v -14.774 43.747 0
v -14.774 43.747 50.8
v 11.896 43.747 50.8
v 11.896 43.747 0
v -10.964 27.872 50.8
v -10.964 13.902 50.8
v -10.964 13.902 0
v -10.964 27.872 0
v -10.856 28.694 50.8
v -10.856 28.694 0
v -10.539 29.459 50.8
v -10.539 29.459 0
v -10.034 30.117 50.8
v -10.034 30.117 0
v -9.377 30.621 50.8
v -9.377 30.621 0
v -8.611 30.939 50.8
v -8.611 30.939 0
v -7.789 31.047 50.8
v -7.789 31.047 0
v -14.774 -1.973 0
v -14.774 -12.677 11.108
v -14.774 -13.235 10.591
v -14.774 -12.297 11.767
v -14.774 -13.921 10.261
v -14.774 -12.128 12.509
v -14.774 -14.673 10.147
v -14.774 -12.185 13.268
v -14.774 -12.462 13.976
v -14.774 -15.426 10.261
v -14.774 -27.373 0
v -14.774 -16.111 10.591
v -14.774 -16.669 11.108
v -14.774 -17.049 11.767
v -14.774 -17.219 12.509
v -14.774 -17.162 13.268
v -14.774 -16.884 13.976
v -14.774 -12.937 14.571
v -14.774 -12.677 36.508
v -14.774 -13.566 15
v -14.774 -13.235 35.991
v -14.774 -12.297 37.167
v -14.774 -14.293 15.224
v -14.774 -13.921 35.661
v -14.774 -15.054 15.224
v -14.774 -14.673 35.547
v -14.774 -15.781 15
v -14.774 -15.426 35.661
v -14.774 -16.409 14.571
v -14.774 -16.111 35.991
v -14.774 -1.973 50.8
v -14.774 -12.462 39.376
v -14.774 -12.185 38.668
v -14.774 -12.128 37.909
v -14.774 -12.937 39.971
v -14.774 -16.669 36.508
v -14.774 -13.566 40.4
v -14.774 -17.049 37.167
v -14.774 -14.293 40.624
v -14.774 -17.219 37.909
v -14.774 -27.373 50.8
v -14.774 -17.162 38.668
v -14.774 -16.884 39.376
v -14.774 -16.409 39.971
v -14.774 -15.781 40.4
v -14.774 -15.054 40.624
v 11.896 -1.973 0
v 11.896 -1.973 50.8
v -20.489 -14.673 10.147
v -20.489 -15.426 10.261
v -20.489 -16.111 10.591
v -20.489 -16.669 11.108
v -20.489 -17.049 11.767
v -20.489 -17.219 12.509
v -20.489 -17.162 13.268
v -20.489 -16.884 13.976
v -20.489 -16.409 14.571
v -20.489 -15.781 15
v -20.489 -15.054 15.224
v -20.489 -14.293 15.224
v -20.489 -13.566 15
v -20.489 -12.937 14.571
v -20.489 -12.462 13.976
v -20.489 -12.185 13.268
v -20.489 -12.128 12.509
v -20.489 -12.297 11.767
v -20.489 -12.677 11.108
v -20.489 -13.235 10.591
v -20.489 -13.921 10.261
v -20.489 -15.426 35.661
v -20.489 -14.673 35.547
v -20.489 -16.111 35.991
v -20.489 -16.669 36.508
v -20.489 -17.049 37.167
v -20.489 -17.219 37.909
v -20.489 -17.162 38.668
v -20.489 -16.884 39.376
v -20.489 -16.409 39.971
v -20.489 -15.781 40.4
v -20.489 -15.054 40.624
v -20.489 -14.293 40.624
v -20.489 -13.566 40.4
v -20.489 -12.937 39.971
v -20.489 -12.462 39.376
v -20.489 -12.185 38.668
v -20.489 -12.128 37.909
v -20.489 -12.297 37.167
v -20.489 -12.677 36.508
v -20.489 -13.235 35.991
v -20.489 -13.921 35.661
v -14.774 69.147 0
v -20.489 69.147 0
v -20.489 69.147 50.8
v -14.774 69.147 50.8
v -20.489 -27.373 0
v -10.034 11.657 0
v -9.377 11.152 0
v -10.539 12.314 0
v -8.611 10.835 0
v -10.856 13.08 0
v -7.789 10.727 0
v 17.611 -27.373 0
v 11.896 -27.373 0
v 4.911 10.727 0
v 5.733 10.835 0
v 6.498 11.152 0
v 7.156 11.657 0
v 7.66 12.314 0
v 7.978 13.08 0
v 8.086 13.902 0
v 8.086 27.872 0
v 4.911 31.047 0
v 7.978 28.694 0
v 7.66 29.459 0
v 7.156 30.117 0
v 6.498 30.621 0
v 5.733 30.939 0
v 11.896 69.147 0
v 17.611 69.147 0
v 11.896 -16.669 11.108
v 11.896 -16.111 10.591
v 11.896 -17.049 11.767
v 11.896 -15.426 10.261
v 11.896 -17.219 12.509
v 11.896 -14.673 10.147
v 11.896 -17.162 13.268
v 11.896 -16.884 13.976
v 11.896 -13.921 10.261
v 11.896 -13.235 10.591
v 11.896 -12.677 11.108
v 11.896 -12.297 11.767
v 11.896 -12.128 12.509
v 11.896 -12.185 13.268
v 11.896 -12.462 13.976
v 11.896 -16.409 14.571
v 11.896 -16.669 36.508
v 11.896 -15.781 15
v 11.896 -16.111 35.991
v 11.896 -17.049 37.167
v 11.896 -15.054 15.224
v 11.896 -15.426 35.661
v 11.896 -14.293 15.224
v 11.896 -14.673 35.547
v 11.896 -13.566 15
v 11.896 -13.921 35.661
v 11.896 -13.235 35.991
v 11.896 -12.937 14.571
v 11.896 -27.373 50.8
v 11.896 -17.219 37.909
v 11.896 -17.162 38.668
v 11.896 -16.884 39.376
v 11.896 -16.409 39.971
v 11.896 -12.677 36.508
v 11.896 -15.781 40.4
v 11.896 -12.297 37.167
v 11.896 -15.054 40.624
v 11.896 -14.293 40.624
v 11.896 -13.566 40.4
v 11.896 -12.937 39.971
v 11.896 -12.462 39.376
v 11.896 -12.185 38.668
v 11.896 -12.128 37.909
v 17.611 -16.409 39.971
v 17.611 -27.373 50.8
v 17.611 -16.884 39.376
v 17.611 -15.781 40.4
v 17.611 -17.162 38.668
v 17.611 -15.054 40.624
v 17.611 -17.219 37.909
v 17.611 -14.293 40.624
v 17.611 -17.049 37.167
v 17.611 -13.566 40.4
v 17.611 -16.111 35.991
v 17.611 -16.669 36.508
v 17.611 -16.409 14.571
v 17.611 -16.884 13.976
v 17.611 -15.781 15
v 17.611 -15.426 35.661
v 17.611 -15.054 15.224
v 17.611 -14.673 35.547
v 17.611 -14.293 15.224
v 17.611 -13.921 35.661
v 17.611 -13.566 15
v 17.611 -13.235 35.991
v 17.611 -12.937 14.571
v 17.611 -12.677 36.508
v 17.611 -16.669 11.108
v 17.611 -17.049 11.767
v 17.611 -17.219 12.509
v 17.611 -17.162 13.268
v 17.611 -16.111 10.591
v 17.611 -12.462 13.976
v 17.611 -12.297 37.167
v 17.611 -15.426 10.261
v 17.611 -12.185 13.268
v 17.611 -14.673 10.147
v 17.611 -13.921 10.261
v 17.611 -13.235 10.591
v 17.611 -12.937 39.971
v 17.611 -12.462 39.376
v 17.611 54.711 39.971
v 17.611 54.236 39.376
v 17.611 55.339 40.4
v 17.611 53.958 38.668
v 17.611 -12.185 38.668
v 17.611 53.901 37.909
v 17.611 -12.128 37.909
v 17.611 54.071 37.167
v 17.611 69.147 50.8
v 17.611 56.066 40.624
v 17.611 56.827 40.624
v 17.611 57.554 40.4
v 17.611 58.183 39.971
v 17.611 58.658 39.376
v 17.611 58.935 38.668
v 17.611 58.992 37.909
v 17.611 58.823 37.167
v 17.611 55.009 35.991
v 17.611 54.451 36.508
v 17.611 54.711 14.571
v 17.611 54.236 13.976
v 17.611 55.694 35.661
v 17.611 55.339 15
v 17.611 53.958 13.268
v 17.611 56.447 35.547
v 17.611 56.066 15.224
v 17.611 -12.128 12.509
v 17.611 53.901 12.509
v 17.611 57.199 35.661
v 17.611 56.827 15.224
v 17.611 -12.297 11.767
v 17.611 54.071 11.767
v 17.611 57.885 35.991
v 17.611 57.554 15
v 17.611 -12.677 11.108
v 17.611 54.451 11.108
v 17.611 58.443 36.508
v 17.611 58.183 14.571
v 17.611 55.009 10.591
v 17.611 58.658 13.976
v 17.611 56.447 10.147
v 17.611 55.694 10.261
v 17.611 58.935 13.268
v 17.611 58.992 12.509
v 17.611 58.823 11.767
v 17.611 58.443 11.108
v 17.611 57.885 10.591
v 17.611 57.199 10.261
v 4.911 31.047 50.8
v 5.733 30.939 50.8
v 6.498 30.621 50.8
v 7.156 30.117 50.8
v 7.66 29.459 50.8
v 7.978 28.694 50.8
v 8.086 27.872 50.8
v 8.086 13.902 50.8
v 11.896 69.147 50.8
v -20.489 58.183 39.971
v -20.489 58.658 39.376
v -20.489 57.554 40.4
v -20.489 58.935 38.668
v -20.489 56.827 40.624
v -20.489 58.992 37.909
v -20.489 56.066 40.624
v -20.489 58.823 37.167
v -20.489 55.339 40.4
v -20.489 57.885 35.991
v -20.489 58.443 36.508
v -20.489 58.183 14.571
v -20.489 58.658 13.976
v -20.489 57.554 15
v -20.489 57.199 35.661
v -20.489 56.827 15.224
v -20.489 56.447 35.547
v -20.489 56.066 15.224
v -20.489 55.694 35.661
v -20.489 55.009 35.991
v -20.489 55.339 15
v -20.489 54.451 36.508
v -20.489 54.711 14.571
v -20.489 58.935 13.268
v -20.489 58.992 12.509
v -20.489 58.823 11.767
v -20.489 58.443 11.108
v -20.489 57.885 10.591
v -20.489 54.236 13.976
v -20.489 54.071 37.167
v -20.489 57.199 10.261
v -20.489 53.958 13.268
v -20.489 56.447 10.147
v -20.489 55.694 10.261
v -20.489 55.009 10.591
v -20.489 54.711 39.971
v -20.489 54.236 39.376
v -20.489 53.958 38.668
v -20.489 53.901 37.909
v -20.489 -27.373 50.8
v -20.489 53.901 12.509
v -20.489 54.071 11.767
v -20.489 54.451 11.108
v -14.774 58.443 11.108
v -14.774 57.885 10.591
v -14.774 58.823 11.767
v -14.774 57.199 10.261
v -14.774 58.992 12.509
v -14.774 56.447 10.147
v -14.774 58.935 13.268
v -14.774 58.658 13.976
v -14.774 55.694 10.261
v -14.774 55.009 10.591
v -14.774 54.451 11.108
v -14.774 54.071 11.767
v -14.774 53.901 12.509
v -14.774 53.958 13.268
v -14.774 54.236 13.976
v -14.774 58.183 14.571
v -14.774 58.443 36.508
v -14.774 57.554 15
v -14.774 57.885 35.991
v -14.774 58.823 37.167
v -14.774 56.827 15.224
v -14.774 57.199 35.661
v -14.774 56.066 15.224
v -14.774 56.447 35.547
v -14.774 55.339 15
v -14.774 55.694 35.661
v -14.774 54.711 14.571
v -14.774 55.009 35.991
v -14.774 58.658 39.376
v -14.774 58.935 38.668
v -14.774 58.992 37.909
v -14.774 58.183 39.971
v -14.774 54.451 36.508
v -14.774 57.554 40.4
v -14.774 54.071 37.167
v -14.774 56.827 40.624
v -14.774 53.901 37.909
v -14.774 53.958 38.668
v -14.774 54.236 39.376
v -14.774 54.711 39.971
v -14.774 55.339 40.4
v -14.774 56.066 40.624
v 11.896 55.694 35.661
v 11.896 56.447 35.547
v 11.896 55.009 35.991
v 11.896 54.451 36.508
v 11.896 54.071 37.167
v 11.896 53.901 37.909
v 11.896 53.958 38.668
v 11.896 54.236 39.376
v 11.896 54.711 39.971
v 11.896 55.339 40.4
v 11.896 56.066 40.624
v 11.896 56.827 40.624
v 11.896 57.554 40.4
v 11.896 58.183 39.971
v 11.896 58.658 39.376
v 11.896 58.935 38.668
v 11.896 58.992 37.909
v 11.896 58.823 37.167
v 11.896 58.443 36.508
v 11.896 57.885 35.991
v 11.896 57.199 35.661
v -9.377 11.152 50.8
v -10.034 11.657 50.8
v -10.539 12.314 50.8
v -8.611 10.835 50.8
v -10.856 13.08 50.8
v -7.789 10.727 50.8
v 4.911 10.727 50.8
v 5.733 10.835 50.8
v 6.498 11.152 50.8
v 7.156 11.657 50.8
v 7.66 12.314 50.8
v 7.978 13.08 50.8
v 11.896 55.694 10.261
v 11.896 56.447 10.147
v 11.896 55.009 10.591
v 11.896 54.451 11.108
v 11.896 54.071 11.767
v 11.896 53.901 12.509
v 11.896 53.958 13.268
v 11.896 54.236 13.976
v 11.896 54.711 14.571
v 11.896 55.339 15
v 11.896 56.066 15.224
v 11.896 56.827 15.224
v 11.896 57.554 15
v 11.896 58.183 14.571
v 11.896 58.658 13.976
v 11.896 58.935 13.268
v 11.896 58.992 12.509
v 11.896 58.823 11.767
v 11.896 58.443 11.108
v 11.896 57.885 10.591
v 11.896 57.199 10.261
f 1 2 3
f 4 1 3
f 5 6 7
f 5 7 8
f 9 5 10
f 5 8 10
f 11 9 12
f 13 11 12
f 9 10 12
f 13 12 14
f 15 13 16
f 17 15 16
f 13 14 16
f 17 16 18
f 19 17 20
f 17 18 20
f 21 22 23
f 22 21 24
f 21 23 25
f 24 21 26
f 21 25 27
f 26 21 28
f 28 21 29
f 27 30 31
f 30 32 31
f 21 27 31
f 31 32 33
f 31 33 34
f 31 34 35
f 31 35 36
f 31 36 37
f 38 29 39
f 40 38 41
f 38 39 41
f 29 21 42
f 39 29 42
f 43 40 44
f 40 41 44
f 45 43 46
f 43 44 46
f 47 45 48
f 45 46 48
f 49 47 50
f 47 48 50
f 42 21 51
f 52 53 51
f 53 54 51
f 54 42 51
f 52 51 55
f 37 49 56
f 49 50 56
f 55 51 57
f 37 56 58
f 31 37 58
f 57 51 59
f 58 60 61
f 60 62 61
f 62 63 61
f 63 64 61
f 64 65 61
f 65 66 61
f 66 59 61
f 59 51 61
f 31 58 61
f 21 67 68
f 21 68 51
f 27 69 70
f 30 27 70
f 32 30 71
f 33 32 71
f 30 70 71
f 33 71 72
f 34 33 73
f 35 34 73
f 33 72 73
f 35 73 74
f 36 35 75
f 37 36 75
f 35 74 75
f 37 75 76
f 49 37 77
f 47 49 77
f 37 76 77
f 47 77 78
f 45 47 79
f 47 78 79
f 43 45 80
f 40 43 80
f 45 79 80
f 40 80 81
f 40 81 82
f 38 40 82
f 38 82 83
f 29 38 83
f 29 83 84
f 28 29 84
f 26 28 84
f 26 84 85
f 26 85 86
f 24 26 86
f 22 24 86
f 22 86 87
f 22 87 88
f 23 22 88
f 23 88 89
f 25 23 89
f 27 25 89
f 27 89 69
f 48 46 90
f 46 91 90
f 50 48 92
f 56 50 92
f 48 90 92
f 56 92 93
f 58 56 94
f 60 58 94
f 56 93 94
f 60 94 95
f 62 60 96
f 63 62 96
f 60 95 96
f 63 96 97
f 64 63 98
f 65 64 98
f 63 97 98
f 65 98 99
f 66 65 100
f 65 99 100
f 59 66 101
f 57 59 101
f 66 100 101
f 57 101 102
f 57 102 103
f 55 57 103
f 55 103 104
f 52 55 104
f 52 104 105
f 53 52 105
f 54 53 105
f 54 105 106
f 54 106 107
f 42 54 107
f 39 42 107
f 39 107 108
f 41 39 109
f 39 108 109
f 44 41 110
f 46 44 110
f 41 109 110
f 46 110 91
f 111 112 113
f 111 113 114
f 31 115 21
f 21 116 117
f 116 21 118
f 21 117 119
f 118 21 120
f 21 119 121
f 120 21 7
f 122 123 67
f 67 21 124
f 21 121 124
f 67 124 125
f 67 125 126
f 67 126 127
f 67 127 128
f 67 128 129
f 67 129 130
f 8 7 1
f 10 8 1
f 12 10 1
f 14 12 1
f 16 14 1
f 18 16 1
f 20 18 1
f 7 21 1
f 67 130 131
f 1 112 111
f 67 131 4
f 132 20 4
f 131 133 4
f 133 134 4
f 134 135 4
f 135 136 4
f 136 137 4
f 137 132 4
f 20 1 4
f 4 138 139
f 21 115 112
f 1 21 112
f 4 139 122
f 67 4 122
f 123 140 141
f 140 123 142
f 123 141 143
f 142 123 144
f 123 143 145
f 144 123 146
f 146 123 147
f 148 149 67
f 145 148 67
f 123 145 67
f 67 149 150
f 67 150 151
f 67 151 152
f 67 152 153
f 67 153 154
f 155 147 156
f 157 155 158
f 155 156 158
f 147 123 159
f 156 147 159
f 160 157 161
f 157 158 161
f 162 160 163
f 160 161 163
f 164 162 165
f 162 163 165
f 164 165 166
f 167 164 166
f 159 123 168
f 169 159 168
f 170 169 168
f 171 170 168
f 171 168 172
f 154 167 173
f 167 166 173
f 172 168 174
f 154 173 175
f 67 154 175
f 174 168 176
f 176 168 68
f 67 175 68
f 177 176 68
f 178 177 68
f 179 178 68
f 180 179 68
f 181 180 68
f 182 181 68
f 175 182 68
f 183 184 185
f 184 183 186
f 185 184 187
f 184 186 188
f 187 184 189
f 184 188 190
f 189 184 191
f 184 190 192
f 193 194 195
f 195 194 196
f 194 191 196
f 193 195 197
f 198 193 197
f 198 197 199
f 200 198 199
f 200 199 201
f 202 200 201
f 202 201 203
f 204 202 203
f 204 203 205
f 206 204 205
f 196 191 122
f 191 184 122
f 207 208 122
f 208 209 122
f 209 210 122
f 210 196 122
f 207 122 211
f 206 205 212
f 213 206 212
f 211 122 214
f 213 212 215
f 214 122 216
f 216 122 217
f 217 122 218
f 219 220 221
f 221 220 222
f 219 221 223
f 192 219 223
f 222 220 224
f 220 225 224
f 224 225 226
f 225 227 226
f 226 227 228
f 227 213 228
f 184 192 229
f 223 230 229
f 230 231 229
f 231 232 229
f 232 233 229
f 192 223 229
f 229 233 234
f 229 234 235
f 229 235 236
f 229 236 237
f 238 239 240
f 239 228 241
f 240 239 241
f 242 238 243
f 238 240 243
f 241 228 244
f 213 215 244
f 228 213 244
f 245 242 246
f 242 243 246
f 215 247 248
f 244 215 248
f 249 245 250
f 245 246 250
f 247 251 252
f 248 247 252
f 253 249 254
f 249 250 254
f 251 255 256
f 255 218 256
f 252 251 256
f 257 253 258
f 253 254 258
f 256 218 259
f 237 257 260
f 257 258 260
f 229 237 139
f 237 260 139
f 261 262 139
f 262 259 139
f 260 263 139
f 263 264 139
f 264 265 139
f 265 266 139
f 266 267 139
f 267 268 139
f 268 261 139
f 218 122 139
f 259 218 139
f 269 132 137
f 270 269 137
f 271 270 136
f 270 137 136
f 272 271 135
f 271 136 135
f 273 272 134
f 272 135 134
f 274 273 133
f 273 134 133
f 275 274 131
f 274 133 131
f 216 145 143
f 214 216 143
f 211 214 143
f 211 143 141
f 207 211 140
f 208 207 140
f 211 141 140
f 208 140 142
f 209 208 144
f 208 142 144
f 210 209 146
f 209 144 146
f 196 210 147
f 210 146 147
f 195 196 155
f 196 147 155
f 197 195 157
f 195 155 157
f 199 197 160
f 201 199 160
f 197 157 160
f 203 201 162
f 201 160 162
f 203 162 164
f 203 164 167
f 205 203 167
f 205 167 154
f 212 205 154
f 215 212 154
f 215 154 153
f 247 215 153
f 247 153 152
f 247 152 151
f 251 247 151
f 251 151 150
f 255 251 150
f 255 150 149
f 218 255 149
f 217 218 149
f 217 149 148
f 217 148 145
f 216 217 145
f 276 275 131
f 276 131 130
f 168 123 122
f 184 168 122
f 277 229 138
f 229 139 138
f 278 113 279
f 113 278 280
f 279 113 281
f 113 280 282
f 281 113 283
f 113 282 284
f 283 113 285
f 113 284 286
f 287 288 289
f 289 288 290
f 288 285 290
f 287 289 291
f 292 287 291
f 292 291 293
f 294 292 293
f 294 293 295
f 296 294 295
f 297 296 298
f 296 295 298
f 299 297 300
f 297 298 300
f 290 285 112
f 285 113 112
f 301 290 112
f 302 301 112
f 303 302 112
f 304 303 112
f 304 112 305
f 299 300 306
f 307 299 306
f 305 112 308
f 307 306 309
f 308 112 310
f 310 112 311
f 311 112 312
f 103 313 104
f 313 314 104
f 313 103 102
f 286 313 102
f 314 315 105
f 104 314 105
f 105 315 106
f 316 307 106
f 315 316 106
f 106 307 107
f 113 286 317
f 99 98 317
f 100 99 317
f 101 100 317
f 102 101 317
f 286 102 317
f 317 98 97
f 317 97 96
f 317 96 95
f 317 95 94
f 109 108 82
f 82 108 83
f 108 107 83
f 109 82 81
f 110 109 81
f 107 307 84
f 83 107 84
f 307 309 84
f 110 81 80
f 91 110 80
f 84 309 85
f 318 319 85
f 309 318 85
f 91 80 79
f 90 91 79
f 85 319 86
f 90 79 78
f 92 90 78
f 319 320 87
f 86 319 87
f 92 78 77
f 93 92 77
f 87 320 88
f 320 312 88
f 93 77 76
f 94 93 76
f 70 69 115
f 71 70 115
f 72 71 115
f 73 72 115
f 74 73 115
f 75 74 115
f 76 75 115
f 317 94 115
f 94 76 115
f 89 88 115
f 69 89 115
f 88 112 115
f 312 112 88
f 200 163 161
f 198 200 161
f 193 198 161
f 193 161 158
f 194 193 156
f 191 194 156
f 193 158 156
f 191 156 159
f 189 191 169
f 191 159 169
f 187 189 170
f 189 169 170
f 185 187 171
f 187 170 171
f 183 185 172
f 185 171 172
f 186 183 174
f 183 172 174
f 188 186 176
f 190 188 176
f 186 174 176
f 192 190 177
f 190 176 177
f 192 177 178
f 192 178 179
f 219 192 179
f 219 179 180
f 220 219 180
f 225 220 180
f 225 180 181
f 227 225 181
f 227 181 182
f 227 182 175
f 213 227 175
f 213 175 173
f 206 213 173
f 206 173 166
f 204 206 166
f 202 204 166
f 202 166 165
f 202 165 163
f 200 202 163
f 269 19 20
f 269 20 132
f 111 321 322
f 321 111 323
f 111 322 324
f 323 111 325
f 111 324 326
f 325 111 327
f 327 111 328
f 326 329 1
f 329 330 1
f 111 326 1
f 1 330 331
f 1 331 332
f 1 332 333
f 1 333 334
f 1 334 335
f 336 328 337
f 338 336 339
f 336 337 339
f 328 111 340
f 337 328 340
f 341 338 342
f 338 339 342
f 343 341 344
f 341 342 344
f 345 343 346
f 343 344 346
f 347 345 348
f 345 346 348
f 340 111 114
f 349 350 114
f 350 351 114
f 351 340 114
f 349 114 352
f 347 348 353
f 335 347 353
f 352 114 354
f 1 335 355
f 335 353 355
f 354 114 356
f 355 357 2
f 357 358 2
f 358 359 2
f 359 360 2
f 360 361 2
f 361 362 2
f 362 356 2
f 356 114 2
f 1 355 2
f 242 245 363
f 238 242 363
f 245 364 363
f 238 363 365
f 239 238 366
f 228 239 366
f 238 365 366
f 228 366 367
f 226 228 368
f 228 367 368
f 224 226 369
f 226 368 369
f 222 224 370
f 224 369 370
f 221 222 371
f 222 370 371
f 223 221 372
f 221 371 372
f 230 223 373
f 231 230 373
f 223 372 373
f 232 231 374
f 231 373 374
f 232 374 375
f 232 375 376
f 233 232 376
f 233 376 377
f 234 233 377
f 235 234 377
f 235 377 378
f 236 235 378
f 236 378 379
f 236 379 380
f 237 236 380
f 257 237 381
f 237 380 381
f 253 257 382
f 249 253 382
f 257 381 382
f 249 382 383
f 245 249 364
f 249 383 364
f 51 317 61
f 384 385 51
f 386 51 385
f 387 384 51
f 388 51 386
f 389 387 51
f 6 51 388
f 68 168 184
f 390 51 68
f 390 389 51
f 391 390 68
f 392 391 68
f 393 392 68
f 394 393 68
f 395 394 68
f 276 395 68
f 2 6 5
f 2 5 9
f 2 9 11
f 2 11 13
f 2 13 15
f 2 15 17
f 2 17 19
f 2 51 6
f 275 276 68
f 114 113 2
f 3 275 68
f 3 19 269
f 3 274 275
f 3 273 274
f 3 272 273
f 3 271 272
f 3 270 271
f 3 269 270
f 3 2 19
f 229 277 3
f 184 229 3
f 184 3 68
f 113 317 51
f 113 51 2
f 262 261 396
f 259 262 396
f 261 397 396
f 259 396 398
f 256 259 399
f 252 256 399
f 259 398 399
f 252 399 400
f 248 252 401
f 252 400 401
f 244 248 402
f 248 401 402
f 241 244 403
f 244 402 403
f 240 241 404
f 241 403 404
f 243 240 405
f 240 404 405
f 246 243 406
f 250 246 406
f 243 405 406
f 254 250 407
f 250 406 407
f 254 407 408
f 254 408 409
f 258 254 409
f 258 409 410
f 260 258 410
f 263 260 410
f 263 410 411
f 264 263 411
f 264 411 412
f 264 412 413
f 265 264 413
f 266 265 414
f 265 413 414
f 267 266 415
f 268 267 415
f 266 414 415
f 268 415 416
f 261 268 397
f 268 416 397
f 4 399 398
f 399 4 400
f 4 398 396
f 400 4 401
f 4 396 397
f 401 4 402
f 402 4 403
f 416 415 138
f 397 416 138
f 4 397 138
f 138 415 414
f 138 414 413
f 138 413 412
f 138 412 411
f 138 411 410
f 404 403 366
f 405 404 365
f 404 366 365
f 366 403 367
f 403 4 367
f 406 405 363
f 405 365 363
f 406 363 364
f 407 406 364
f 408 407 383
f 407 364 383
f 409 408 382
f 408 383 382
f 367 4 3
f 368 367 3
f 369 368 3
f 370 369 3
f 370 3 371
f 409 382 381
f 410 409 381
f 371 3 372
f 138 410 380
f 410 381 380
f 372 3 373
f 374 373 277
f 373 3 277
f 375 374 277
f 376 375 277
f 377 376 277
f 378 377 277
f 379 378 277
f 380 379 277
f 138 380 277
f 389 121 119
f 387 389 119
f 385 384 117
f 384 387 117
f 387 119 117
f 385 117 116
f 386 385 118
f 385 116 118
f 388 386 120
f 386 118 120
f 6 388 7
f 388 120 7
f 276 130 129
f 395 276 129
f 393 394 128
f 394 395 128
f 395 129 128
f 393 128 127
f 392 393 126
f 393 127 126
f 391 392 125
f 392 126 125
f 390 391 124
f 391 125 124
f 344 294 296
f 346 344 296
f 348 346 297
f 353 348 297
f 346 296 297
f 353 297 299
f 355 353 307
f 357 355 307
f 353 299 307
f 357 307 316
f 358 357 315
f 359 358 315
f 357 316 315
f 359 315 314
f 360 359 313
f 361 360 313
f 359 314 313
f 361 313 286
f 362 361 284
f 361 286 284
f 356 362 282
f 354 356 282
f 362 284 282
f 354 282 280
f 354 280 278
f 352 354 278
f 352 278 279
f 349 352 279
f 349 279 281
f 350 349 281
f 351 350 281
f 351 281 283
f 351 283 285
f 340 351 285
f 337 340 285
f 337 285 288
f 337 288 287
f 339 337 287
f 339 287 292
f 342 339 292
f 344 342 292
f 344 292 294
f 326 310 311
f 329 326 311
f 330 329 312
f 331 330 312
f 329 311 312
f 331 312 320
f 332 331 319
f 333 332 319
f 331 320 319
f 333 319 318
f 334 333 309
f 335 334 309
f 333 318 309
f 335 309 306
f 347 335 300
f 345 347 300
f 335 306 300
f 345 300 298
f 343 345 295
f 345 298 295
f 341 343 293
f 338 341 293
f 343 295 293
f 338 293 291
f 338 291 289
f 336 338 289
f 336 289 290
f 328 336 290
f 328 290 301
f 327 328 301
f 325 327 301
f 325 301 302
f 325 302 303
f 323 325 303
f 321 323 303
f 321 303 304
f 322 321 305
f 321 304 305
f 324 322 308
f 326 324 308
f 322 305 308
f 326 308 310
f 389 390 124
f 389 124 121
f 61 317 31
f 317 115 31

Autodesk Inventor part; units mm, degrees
ref_plane "YZ Plane" through (0, 0, 0) normal (1, 0, 0) x (0, 1, 0)
ref_plane "XZ Plane" through (0, 0, 0) normal (0, 1, 0) x (-1, 0, 0)
ref_plane "XY Plane" through (0, 0, 0) normal (0, 0, 1) x (1, 0, 0)
sketch "Bracket-CrossArea" plane through (0, 0, 0) normal (0, 0, 1) x (1, 0, 0)
  line L0 (-20.4892, 69.1468) -> (-20.4892, -27.3732)
  line L1 (-20.4892, -27.3732) -> (-14.1392, -27.3732)
  line L2 (-14.1392, -27.3732) -> (-14.1392, -1.9732)
  line L3 (-14.1392, -1.9732) -> (11.2608, -1.9732)
  line L4 (11.2608, -1.9732) -> (11.2608, -27.3732)
  line L5 (11.2608, -27.3732) -> (17.6108, -27.3732)
  line L6 (17.6108, -27.3732) -> (17.6108, 69.1468)
  line L7 (17.6108, 69.1468) -> (11.2608, 69.1468)
  line L8 (11.2608, 69.1468) -> (11.2608, 43.7468)
  line L9 (11.2608, 43.7468) -> (-14.1392, 43.7468)
  line L10 (-14.1392, 43.7468) -> (-14.1392, 69.1468)
  line L11 (-20.4892, 69.1468) -> (-14.1392, 69.1468)
  point P0 (0, 0)
  dimension "d3" = 6.35
  dimension "d4" = 96.52
  dimension "d5" = 25.4
  dimension "d6" = 25.4
  dimension "d7" = 6.35
  dimension "d10" = 25.4
extrude "HBracket_3DShape" add sketch "Bracket-CrossArea" along normal blind 50.8
sketch "Sketch2" plane through (0, 0, 50.8) normal (0, 0, 1) x (1, 0, 0)
  line L0 (-10.9642, 31.0468) -> (8.0858, 31.0468)
  line L1 (8.0858, 31.0468) -> (8.0858, 10.7268)
  line L2 (8.0858, 10.7268) -> (-10.9642, 10.7268)
  line L3 (-10.9642, 10.7268) -> (-10.9642, 31.0468)
  line L4 (11.2608, 43.7468) -> (-14.1392, 43.7468) projected
  line L5 (-14.1392, -1.9732) -> (11.2608, -1.9732) projected
  line L6 (-14.1392, 43.7468) -> (-14.1392, 69.1468) projected
  line L7 (11.2608, 69.1468) -> (11.2608, 43.7468) projected
  line L8 (17.6108, -27.3732) -> (17.6108, 69.1468) projected
  line L9 (-20.4892, 69.1468) -> (-20.4892, -27.3732) projected
  point P0 (0, 0)
  dimension "d11" = 12.7
  dimension "d12" = 12.7
  dimension "d29" = 9.525
  dimension "d30" = 9.525
extrude "MiddleHole" cut sketch "Sketch2" against normal through all
fillet "RoundedInside" radius 3.175 4 edges at (-10.9642, 10.7268, 25.4) (-10.9642, 31.0468, 25.4) (8.0858, 31.0468, 25.4) (8.0858, 10.7268, 25.4)
sketch "Sketch4" plane through (17.6108, -27.3732, 0) normal (1, 0, 0) x (0, 0, -1)
  line L0 (0, 71.12) -> (-50.8, 71.12) projected
  line L1 (0, 71.12) -> (-50.8, 71.12) projected
  line L2 (0, 0) -> (-50.8, 0) projected
  line L3 (0, 25.4) -> (-50.8, 25.4) projected
  line L4 (0, 0) -> (0, 96.52) projected
  line L5 (0, 96.52) -> (-50.8, 96.52) projected
  line L6 (-50.8, 0) -> (-50.8, 96.52) projected
  line L7 (0, 0) -> (-50.8, 0) projected
  point P0 (0, 27.3732)
  point P1 (-38.1, 83.82)
  point P2 (-12.7, 83.82)
  point P3 (-38.1, 12.7)
  point P4 (-12.7, 12.7)
  dimension "d48" = 12.7
  dimension "d49" = 12.7
  dimension "d52" = 25.4
  dimension "d55" = 71.12
hole "Screw Holes" at (17.6108, 56.4468, 38.1) at (17.6108, 56.4468, 12.7) at (17.6108, -14.6732, 38.1) at (17.6108, -14.6732, 12.7) direction (-1, 0, 0) diameter 5.1054 end through all clearance for "Hex Machine Screw" size "#10" standard "Ansi Unified Screw Threads"
sketch "GapSpacing" plane through (0, 0, 50.8) normal (0, 0, 1) x (1, 0, 0)
  line L0 (-20.4892, -27.3732) -> (-14.1392, -27.3732) projected
  line L1 (-14.1392, -27.3732) -> (-14.1392, -1.9732) projected
  line L2 (-14.1392, -1.9732) -> (11.2608, -1.9732) projected
  line L3 (11.2608, -1.9732) -> (11.2608, -27.3732) projected
  line L4 (11.2608, -27.3732) -> (17.6108, -27.3732) projected
  line L5 (17.6108, -27.3732) -> (17.6108, 69.1468) projected
  line L6 (17.6108, 69.1468) -> (11.2608, 69.1468) projected
  line L7 (11.2608, 69.1468) -> (11.2608, 43.7468) projected
  line L8 (11.2608, 43.7468) -> (-14.1392, 43.7468) projected
  line L9 (-14.1392, 43.7468) -> (-14.1392, 69.1468) projected
  line L10 (-14.1392, 69.1468) -> (-20.4892, 69.1468) projected
  line L11 (-20.4892, 69.1468) -> (-20.4892, -27.3732) projected
  line L12 (-14.7742, 43.7468) -> (11.8958, 43.7468)
  line L13 (11.8958, 43.7468) -> (11.8958, 73.025)
  line L14 (11.8958, 73.025) -> (-14.7742, 73.025)
  line L15 (-14.7742, 73.025) -> (-14.7742, 43.7468)
  line L16 (-14.7742, -30.1625) -> (11.8958, -30.1625)
  line L17 (11.8958, -30.1625) -> (11.8958, -1.9732)
  line L18 (11.8958, -1.9732) -> (-14.7742, -1.9732)
  line L19 (-14.7742, -1.9732) -> (-14.7742, -30.1625)
  point P0 (-14.7742, -27.3732)
  point P1 (11.8958, -27.3732)
  point P2 (11.8958, 69.1468)
  point P3 (-14.7742, 69.1468)
  point P4 (-14.1392, 43.7468)
  point P5 (-14.1392, 43.7468)
  dimension "d58" = 0.635
  dimension "d59" = 0.635
  dimension "d62" = 0.635
  dimension "d63" = 0.635
extrude "GapSpace" cut sketch "GapSpacing" against normal through all contours L19 L18 L1 L0 | L0 L1 L2 L3 L4 L17 L16 L19 | L15 L14 L13 L6 L7 L8 L9 L10 | L10 L9 L12 L15 | L18 L17 L4 L3 | L7 L6 L13 L12
equation "\"d6\" = d5"
equation "\"d7\" = d3"
equation "\"d12\" = d11"
equation "\"d30\" = d29"
equation "\"d59\" = d58"
equation "\"d62\" = d58"
equation "\"d63\" = d58"
properties part number "Arm_H-Bracket"
